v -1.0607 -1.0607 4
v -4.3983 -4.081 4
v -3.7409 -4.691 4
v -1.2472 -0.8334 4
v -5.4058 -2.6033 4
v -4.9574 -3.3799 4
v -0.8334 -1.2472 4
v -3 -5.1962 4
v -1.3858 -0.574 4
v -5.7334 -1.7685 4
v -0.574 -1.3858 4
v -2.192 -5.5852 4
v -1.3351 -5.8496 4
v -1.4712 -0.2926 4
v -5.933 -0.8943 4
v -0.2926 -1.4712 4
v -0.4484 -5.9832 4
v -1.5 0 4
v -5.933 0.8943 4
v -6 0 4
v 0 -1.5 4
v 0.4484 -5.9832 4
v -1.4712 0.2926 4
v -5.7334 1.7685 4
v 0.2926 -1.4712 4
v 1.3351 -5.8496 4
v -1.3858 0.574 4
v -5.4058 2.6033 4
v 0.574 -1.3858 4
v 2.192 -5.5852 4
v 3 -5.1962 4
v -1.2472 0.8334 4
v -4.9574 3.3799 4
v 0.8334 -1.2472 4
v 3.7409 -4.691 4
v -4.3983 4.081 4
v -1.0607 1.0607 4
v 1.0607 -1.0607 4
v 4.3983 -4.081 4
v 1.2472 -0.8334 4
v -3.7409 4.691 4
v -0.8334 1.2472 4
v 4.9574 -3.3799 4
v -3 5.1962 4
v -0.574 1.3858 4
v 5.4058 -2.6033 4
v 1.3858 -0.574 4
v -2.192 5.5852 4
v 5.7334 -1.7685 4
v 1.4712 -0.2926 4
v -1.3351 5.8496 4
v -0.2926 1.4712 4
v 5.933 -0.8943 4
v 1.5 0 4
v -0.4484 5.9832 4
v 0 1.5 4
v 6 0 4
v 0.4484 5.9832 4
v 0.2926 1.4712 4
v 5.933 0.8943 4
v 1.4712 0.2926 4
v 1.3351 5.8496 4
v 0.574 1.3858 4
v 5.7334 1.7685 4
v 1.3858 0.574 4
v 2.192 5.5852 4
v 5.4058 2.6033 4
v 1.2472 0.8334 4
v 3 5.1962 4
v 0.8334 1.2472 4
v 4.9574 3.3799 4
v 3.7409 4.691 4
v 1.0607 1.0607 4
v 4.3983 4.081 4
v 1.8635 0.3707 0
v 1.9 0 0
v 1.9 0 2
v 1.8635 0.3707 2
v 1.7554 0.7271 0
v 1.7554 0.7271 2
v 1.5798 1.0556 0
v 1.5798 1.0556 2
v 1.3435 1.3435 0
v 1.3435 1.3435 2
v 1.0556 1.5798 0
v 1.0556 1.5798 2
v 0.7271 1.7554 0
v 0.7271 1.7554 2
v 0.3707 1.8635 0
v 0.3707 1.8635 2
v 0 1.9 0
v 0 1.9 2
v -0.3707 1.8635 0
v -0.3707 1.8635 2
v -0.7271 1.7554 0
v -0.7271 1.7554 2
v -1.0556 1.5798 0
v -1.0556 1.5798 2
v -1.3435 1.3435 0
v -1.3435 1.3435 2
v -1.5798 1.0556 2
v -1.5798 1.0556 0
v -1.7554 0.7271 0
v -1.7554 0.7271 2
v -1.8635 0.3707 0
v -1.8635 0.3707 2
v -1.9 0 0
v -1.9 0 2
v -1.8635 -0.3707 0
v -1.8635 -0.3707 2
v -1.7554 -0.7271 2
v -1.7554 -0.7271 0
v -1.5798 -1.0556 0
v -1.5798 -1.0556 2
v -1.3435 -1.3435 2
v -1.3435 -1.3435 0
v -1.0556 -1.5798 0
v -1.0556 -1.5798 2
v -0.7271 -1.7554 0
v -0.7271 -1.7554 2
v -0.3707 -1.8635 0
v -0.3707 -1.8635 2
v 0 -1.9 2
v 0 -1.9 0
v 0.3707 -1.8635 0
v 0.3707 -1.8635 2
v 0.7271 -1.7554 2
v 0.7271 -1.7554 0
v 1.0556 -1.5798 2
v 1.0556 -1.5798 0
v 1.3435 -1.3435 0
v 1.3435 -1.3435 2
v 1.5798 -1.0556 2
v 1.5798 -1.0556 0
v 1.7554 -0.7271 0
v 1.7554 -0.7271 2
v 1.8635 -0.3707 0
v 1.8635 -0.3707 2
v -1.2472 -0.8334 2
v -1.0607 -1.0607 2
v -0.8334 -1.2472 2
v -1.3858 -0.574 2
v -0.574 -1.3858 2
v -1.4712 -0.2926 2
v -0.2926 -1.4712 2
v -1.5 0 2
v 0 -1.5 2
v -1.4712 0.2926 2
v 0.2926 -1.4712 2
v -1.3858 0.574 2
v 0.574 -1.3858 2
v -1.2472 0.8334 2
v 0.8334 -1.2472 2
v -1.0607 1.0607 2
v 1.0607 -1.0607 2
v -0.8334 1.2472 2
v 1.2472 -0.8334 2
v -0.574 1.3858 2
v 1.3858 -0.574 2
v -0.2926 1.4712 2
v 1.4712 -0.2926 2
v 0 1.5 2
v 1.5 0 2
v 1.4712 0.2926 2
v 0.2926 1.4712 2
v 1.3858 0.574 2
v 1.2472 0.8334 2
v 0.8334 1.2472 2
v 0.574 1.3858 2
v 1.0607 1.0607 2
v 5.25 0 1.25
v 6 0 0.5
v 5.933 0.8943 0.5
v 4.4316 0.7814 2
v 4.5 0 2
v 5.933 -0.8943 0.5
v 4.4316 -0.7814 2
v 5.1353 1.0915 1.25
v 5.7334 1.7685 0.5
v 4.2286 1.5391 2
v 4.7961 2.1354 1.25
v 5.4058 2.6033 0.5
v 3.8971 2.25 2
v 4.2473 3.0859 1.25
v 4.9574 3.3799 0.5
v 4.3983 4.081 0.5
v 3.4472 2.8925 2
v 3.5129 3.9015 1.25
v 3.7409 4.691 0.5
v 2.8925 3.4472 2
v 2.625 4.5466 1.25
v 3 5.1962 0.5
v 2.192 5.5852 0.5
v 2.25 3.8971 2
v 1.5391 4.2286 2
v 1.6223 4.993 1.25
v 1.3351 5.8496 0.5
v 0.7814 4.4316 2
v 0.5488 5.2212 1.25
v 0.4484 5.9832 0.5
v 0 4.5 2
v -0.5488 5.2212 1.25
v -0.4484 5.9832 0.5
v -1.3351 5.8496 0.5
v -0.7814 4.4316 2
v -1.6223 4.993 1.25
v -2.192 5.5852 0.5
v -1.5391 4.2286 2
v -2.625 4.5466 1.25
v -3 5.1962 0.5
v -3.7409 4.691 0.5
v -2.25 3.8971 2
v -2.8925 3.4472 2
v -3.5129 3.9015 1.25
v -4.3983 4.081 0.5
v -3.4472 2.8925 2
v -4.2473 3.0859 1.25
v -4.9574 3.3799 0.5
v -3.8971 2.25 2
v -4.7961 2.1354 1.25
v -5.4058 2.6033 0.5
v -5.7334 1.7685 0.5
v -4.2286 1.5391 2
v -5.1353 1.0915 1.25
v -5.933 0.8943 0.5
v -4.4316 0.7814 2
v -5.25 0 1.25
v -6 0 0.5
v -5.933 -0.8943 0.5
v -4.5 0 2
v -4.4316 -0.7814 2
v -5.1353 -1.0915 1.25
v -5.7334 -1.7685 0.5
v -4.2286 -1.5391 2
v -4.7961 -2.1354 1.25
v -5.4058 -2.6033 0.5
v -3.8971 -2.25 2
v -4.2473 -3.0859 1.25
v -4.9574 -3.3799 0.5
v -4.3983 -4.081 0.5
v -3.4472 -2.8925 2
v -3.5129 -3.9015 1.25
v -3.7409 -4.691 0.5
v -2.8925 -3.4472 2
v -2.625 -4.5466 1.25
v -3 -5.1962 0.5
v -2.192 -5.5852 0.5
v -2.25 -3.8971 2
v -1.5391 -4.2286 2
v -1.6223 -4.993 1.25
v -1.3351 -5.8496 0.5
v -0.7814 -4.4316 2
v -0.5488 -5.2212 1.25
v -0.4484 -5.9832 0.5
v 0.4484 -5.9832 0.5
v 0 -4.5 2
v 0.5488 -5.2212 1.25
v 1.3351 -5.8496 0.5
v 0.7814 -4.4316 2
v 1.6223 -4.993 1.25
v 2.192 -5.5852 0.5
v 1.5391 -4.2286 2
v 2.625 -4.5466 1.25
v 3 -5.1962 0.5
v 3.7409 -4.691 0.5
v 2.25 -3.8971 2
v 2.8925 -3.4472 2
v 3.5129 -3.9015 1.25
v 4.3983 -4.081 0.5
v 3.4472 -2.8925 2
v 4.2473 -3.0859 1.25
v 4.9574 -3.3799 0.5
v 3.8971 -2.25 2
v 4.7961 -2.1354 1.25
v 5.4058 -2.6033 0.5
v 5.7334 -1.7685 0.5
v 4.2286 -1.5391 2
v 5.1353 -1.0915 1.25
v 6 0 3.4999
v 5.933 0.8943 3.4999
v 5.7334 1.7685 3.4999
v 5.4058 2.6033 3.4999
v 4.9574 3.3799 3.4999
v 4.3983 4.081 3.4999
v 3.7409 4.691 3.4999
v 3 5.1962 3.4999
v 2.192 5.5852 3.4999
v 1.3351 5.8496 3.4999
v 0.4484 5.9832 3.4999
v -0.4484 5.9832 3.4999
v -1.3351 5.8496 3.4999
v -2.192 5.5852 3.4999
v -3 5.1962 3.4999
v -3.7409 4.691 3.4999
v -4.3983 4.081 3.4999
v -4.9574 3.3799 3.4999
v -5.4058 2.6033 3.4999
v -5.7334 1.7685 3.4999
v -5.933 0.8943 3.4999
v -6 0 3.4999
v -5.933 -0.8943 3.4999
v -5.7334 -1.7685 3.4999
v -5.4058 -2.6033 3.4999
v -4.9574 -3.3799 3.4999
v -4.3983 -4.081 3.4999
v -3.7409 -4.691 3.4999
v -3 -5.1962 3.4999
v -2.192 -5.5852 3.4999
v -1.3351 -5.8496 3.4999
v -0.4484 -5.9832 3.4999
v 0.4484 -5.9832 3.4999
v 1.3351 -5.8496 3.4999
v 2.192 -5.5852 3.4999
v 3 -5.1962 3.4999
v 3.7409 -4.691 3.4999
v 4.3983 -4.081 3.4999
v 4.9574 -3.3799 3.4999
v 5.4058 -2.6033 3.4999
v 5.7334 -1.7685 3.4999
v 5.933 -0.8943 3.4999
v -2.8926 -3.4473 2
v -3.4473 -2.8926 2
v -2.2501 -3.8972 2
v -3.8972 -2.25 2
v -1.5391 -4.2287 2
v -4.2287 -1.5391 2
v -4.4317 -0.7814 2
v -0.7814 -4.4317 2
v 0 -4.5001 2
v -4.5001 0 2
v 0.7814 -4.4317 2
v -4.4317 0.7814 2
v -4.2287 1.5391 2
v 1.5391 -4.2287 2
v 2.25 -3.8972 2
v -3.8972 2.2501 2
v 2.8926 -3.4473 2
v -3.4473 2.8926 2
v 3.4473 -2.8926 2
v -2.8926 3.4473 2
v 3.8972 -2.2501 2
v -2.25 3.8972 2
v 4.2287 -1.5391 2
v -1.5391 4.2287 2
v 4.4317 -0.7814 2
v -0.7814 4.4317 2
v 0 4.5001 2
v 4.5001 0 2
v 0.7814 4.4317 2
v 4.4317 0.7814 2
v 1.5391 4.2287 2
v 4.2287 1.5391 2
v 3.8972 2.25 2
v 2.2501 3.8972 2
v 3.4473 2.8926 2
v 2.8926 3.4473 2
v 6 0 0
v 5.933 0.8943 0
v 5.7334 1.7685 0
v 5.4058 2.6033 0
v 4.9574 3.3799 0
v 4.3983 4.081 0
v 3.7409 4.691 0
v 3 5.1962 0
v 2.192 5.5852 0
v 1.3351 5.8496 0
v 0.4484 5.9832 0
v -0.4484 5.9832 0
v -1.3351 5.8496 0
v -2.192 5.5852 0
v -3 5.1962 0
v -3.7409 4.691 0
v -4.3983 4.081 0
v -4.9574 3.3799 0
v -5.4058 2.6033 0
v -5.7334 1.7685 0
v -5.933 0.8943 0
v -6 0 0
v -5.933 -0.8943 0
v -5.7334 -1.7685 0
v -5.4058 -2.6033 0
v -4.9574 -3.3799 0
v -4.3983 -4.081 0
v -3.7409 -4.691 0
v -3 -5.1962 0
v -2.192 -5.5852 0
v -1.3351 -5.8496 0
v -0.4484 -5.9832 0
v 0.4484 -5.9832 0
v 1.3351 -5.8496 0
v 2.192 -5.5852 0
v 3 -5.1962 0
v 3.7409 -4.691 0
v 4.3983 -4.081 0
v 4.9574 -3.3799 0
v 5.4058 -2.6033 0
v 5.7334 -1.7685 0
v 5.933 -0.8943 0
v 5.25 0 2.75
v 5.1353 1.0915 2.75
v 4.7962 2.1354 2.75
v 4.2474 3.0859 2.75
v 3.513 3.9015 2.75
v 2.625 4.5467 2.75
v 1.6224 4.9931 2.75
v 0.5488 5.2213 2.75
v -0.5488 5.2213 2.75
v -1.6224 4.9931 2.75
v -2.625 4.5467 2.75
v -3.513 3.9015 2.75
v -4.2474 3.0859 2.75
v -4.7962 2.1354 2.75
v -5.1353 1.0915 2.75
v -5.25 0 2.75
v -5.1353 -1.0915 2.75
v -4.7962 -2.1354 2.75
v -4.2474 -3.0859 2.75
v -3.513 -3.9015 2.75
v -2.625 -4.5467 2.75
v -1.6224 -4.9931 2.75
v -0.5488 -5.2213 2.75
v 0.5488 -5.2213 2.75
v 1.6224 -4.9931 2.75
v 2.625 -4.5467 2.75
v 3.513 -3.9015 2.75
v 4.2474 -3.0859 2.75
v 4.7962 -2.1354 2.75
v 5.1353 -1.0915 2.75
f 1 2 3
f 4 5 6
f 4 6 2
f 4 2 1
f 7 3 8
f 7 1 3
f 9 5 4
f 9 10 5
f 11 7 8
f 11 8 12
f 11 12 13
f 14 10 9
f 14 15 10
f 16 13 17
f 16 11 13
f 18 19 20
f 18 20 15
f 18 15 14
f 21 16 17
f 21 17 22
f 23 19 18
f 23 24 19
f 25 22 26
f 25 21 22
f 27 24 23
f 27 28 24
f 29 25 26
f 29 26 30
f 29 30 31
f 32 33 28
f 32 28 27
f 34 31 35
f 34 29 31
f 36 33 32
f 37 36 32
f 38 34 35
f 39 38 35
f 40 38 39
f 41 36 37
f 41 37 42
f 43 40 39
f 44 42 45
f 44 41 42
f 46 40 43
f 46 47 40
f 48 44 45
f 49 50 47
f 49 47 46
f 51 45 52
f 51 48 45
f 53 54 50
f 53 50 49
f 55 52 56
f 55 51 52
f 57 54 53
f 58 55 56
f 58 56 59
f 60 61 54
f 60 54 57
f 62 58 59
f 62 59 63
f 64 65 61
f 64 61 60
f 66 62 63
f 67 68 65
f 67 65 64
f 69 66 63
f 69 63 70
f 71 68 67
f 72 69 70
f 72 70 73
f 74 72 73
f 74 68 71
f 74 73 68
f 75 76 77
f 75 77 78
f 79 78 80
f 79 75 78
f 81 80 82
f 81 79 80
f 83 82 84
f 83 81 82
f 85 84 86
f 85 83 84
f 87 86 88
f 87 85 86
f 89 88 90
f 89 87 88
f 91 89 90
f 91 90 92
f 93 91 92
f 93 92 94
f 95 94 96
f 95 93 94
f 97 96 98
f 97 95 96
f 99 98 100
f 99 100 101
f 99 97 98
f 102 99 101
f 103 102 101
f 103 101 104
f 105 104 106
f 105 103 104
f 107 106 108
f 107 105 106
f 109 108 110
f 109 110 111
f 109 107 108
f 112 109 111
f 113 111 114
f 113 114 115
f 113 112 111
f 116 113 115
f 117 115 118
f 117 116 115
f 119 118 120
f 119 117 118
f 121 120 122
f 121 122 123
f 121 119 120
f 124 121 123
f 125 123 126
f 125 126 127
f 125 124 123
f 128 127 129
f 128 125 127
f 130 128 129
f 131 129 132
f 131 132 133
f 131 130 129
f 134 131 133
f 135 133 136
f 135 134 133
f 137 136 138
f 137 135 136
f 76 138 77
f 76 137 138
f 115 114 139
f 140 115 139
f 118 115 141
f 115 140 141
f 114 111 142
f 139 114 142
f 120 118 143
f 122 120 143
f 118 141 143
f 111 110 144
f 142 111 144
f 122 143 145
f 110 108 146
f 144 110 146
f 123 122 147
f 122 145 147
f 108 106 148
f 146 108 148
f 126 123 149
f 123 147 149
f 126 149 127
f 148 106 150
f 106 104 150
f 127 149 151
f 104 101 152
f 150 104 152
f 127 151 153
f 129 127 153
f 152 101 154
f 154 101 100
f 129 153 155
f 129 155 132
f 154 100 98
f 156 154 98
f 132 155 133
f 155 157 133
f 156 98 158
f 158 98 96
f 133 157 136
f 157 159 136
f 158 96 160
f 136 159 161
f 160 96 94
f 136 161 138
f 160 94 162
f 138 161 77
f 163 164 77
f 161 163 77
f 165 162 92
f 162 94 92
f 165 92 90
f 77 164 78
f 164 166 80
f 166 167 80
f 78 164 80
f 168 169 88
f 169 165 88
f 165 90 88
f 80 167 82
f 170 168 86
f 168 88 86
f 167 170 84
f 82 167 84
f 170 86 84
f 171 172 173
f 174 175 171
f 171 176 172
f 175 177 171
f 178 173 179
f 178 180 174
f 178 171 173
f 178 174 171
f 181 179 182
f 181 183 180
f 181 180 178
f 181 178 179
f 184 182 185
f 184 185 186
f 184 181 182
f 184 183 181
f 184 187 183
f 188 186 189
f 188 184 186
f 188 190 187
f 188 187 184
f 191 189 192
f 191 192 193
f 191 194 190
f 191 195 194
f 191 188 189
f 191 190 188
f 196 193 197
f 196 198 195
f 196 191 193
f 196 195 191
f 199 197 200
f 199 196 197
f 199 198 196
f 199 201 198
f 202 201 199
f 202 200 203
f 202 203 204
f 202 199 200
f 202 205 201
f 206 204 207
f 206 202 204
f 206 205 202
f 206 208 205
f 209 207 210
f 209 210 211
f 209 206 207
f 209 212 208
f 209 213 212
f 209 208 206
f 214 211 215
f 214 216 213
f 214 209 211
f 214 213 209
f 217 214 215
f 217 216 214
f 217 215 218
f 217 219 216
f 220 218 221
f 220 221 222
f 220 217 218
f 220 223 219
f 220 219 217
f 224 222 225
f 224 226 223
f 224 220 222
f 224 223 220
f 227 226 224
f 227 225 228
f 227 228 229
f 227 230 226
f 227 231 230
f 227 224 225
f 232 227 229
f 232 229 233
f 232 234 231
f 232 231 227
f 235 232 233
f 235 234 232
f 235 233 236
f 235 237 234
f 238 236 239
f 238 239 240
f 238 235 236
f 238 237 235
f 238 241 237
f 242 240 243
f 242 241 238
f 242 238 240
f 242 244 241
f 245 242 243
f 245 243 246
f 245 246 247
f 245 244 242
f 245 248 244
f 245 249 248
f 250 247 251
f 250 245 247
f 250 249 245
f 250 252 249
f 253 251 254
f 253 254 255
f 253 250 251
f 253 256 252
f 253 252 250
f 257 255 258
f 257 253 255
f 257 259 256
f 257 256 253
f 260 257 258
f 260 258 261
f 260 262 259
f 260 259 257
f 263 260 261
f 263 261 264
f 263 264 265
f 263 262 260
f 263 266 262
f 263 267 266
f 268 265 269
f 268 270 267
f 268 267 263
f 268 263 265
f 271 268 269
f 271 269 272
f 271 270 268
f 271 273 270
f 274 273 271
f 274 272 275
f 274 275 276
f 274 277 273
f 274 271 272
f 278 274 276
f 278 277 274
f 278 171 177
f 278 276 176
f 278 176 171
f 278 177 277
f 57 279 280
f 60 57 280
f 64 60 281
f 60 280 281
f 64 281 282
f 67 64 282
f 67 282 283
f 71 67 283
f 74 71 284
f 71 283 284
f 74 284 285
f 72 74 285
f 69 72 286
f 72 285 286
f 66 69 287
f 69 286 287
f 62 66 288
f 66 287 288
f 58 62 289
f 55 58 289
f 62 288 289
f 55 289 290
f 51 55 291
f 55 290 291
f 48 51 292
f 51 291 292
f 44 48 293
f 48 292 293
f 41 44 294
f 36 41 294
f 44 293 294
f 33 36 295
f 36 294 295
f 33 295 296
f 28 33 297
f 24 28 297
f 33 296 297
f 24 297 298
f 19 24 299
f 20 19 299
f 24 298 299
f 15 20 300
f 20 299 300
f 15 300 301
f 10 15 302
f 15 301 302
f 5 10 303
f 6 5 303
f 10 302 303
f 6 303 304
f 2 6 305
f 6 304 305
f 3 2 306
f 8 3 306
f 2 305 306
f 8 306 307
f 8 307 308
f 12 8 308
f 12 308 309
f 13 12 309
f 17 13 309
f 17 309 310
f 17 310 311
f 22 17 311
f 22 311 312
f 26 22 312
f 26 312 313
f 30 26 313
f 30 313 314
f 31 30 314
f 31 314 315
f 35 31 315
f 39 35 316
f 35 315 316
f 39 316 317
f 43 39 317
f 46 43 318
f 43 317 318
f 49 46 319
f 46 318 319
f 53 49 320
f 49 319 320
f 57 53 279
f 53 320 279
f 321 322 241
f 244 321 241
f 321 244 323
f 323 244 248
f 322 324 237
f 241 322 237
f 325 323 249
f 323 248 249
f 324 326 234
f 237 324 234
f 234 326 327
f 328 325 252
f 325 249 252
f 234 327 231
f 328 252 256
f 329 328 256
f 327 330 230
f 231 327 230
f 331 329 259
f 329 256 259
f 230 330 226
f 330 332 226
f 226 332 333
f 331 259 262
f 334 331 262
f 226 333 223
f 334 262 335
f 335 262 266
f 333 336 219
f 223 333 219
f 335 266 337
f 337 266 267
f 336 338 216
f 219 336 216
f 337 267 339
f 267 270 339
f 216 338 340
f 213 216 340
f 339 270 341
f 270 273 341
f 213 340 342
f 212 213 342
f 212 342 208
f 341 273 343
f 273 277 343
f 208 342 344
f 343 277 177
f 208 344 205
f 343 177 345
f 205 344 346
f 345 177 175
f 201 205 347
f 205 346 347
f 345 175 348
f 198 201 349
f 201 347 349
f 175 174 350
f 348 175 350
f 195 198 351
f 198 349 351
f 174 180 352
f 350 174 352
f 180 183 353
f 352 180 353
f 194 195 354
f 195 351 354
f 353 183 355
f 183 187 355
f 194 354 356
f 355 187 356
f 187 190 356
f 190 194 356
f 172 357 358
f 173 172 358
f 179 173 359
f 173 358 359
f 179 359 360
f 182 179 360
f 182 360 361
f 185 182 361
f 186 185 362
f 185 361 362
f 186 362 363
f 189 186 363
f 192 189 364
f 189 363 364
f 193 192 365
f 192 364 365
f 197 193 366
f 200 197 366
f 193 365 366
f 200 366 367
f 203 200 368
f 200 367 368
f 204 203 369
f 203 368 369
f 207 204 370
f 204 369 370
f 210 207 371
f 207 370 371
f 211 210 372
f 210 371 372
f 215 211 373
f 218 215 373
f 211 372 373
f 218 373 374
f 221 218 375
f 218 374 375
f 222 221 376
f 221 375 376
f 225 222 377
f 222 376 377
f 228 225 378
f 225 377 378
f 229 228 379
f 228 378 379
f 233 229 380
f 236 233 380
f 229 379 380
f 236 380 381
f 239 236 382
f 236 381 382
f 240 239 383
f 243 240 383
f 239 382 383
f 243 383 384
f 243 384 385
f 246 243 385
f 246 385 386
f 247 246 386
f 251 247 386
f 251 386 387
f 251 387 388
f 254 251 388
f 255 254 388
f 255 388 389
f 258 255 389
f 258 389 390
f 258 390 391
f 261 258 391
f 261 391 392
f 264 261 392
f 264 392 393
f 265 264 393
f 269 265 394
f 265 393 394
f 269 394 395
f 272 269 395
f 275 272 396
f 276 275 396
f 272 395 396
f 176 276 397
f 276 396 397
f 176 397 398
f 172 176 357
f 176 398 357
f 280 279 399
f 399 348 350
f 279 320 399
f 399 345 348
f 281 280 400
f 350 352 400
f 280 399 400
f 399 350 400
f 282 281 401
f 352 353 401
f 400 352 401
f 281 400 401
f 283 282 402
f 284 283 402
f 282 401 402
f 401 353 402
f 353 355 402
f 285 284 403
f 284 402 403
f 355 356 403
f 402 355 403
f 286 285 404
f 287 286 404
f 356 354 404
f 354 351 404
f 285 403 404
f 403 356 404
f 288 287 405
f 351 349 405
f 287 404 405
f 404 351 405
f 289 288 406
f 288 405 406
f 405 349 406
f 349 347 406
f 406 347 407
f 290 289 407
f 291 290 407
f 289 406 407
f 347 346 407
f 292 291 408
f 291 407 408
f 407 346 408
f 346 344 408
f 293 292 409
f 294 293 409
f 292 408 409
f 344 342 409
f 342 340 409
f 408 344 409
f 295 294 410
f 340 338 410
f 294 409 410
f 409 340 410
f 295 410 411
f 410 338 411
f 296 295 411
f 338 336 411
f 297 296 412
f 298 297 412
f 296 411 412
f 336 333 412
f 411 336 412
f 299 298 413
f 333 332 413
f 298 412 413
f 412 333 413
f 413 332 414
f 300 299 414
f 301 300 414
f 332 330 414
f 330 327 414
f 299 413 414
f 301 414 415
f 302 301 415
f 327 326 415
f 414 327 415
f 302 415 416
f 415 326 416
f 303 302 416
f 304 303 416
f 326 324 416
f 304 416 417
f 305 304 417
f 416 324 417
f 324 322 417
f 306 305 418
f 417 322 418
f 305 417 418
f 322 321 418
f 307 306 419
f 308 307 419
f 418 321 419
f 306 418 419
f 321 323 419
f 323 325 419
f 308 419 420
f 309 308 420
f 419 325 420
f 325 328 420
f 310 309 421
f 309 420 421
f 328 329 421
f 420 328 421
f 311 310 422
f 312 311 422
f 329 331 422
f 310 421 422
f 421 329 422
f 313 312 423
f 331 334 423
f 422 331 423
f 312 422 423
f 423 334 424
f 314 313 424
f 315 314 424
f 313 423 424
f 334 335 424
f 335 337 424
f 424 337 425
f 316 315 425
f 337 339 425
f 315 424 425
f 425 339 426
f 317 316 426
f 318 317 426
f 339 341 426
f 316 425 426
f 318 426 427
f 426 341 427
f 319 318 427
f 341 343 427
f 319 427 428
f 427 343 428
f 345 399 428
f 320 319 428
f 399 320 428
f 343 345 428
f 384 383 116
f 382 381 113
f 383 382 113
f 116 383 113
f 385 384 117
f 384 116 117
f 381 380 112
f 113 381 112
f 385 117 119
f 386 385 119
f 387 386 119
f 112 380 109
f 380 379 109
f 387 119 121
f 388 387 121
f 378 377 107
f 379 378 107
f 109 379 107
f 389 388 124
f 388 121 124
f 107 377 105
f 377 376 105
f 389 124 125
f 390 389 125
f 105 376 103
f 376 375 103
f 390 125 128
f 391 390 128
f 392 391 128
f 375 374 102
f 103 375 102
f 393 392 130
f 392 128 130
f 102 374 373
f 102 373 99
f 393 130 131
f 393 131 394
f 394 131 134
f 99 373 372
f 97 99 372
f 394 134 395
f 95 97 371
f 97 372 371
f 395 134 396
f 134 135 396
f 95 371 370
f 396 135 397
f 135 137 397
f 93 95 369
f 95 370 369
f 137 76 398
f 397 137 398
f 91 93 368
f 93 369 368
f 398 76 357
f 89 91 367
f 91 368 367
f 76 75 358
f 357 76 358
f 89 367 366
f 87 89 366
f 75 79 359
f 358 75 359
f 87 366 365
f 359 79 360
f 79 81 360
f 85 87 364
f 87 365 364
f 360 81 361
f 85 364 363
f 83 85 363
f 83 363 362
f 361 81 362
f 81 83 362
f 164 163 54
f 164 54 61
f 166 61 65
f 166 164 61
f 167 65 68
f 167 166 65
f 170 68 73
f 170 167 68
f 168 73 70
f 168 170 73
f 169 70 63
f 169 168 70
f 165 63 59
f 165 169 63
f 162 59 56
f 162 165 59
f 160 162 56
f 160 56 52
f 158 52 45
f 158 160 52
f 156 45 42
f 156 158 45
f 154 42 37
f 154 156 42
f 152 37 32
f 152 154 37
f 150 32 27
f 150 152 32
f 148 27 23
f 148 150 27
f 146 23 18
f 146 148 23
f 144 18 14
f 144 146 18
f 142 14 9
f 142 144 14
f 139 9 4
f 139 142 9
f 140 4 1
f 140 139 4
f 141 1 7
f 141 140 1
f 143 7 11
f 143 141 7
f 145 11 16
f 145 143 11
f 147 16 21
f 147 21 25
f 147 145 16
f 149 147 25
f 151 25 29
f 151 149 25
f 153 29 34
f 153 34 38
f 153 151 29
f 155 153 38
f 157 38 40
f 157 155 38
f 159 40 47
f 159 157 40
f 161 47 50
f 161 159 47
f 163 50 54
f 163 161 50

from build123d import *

# Parameters (mm, degrees)
SKETCH1_R           = 6
SKETCH1_R_2         = 1.9
BOSS_EXTRUDE1_DEPTH = 2
CHAMFER1_SIZE       = 1.5
SKETCH2_R           = 6
SKETCH2_R_2         = 1.5
BOSS_EXTRUDE2_DEPTH = 2
CHAMFER2_SIZE       = 1.5


with BuildPart() as part:
    # Sketch1 → Boss-Extrude1 (new body)
    with BuildSketch(Plane.XY):
        Circle(SKETCH1_R)
        Circle(SKETCH1_R_2, mode=Mode.SUBTRACT)
    extrude(amount=BOSS_EXTRUDE1_DEPTH)

    # Chamfer1
    chamfer1_edges = [part.edges().sort_by_distance(p)[0] for p in [
        (-6, 0, 2),
    ]]
    chamfer(chamfer1_edges, length=CHAMFER1_SIZE)

    # Sketch2 → Boss-Extrude2 (add)
    with BuildSketch(Plane.XY.offset(2)):
        Circle(SKETCH2_R)
        Circle(SKETCH2_R_2, mode=Mode.SUBTRACT)
    extrude(amount=BOSS_EXTRUDE2_DEPTH)

    # Chamfer2
    chamfer2_edges = [part.edges().sort_by_distance(p)[0] for p in [
        (-6, 0, 2),
    ]]
    chamfer(chamfer2_edges, length=CHAMFER2_SIZE - 0.0001)  # a hair under: the kernel refuses the full size


solid = part.part
